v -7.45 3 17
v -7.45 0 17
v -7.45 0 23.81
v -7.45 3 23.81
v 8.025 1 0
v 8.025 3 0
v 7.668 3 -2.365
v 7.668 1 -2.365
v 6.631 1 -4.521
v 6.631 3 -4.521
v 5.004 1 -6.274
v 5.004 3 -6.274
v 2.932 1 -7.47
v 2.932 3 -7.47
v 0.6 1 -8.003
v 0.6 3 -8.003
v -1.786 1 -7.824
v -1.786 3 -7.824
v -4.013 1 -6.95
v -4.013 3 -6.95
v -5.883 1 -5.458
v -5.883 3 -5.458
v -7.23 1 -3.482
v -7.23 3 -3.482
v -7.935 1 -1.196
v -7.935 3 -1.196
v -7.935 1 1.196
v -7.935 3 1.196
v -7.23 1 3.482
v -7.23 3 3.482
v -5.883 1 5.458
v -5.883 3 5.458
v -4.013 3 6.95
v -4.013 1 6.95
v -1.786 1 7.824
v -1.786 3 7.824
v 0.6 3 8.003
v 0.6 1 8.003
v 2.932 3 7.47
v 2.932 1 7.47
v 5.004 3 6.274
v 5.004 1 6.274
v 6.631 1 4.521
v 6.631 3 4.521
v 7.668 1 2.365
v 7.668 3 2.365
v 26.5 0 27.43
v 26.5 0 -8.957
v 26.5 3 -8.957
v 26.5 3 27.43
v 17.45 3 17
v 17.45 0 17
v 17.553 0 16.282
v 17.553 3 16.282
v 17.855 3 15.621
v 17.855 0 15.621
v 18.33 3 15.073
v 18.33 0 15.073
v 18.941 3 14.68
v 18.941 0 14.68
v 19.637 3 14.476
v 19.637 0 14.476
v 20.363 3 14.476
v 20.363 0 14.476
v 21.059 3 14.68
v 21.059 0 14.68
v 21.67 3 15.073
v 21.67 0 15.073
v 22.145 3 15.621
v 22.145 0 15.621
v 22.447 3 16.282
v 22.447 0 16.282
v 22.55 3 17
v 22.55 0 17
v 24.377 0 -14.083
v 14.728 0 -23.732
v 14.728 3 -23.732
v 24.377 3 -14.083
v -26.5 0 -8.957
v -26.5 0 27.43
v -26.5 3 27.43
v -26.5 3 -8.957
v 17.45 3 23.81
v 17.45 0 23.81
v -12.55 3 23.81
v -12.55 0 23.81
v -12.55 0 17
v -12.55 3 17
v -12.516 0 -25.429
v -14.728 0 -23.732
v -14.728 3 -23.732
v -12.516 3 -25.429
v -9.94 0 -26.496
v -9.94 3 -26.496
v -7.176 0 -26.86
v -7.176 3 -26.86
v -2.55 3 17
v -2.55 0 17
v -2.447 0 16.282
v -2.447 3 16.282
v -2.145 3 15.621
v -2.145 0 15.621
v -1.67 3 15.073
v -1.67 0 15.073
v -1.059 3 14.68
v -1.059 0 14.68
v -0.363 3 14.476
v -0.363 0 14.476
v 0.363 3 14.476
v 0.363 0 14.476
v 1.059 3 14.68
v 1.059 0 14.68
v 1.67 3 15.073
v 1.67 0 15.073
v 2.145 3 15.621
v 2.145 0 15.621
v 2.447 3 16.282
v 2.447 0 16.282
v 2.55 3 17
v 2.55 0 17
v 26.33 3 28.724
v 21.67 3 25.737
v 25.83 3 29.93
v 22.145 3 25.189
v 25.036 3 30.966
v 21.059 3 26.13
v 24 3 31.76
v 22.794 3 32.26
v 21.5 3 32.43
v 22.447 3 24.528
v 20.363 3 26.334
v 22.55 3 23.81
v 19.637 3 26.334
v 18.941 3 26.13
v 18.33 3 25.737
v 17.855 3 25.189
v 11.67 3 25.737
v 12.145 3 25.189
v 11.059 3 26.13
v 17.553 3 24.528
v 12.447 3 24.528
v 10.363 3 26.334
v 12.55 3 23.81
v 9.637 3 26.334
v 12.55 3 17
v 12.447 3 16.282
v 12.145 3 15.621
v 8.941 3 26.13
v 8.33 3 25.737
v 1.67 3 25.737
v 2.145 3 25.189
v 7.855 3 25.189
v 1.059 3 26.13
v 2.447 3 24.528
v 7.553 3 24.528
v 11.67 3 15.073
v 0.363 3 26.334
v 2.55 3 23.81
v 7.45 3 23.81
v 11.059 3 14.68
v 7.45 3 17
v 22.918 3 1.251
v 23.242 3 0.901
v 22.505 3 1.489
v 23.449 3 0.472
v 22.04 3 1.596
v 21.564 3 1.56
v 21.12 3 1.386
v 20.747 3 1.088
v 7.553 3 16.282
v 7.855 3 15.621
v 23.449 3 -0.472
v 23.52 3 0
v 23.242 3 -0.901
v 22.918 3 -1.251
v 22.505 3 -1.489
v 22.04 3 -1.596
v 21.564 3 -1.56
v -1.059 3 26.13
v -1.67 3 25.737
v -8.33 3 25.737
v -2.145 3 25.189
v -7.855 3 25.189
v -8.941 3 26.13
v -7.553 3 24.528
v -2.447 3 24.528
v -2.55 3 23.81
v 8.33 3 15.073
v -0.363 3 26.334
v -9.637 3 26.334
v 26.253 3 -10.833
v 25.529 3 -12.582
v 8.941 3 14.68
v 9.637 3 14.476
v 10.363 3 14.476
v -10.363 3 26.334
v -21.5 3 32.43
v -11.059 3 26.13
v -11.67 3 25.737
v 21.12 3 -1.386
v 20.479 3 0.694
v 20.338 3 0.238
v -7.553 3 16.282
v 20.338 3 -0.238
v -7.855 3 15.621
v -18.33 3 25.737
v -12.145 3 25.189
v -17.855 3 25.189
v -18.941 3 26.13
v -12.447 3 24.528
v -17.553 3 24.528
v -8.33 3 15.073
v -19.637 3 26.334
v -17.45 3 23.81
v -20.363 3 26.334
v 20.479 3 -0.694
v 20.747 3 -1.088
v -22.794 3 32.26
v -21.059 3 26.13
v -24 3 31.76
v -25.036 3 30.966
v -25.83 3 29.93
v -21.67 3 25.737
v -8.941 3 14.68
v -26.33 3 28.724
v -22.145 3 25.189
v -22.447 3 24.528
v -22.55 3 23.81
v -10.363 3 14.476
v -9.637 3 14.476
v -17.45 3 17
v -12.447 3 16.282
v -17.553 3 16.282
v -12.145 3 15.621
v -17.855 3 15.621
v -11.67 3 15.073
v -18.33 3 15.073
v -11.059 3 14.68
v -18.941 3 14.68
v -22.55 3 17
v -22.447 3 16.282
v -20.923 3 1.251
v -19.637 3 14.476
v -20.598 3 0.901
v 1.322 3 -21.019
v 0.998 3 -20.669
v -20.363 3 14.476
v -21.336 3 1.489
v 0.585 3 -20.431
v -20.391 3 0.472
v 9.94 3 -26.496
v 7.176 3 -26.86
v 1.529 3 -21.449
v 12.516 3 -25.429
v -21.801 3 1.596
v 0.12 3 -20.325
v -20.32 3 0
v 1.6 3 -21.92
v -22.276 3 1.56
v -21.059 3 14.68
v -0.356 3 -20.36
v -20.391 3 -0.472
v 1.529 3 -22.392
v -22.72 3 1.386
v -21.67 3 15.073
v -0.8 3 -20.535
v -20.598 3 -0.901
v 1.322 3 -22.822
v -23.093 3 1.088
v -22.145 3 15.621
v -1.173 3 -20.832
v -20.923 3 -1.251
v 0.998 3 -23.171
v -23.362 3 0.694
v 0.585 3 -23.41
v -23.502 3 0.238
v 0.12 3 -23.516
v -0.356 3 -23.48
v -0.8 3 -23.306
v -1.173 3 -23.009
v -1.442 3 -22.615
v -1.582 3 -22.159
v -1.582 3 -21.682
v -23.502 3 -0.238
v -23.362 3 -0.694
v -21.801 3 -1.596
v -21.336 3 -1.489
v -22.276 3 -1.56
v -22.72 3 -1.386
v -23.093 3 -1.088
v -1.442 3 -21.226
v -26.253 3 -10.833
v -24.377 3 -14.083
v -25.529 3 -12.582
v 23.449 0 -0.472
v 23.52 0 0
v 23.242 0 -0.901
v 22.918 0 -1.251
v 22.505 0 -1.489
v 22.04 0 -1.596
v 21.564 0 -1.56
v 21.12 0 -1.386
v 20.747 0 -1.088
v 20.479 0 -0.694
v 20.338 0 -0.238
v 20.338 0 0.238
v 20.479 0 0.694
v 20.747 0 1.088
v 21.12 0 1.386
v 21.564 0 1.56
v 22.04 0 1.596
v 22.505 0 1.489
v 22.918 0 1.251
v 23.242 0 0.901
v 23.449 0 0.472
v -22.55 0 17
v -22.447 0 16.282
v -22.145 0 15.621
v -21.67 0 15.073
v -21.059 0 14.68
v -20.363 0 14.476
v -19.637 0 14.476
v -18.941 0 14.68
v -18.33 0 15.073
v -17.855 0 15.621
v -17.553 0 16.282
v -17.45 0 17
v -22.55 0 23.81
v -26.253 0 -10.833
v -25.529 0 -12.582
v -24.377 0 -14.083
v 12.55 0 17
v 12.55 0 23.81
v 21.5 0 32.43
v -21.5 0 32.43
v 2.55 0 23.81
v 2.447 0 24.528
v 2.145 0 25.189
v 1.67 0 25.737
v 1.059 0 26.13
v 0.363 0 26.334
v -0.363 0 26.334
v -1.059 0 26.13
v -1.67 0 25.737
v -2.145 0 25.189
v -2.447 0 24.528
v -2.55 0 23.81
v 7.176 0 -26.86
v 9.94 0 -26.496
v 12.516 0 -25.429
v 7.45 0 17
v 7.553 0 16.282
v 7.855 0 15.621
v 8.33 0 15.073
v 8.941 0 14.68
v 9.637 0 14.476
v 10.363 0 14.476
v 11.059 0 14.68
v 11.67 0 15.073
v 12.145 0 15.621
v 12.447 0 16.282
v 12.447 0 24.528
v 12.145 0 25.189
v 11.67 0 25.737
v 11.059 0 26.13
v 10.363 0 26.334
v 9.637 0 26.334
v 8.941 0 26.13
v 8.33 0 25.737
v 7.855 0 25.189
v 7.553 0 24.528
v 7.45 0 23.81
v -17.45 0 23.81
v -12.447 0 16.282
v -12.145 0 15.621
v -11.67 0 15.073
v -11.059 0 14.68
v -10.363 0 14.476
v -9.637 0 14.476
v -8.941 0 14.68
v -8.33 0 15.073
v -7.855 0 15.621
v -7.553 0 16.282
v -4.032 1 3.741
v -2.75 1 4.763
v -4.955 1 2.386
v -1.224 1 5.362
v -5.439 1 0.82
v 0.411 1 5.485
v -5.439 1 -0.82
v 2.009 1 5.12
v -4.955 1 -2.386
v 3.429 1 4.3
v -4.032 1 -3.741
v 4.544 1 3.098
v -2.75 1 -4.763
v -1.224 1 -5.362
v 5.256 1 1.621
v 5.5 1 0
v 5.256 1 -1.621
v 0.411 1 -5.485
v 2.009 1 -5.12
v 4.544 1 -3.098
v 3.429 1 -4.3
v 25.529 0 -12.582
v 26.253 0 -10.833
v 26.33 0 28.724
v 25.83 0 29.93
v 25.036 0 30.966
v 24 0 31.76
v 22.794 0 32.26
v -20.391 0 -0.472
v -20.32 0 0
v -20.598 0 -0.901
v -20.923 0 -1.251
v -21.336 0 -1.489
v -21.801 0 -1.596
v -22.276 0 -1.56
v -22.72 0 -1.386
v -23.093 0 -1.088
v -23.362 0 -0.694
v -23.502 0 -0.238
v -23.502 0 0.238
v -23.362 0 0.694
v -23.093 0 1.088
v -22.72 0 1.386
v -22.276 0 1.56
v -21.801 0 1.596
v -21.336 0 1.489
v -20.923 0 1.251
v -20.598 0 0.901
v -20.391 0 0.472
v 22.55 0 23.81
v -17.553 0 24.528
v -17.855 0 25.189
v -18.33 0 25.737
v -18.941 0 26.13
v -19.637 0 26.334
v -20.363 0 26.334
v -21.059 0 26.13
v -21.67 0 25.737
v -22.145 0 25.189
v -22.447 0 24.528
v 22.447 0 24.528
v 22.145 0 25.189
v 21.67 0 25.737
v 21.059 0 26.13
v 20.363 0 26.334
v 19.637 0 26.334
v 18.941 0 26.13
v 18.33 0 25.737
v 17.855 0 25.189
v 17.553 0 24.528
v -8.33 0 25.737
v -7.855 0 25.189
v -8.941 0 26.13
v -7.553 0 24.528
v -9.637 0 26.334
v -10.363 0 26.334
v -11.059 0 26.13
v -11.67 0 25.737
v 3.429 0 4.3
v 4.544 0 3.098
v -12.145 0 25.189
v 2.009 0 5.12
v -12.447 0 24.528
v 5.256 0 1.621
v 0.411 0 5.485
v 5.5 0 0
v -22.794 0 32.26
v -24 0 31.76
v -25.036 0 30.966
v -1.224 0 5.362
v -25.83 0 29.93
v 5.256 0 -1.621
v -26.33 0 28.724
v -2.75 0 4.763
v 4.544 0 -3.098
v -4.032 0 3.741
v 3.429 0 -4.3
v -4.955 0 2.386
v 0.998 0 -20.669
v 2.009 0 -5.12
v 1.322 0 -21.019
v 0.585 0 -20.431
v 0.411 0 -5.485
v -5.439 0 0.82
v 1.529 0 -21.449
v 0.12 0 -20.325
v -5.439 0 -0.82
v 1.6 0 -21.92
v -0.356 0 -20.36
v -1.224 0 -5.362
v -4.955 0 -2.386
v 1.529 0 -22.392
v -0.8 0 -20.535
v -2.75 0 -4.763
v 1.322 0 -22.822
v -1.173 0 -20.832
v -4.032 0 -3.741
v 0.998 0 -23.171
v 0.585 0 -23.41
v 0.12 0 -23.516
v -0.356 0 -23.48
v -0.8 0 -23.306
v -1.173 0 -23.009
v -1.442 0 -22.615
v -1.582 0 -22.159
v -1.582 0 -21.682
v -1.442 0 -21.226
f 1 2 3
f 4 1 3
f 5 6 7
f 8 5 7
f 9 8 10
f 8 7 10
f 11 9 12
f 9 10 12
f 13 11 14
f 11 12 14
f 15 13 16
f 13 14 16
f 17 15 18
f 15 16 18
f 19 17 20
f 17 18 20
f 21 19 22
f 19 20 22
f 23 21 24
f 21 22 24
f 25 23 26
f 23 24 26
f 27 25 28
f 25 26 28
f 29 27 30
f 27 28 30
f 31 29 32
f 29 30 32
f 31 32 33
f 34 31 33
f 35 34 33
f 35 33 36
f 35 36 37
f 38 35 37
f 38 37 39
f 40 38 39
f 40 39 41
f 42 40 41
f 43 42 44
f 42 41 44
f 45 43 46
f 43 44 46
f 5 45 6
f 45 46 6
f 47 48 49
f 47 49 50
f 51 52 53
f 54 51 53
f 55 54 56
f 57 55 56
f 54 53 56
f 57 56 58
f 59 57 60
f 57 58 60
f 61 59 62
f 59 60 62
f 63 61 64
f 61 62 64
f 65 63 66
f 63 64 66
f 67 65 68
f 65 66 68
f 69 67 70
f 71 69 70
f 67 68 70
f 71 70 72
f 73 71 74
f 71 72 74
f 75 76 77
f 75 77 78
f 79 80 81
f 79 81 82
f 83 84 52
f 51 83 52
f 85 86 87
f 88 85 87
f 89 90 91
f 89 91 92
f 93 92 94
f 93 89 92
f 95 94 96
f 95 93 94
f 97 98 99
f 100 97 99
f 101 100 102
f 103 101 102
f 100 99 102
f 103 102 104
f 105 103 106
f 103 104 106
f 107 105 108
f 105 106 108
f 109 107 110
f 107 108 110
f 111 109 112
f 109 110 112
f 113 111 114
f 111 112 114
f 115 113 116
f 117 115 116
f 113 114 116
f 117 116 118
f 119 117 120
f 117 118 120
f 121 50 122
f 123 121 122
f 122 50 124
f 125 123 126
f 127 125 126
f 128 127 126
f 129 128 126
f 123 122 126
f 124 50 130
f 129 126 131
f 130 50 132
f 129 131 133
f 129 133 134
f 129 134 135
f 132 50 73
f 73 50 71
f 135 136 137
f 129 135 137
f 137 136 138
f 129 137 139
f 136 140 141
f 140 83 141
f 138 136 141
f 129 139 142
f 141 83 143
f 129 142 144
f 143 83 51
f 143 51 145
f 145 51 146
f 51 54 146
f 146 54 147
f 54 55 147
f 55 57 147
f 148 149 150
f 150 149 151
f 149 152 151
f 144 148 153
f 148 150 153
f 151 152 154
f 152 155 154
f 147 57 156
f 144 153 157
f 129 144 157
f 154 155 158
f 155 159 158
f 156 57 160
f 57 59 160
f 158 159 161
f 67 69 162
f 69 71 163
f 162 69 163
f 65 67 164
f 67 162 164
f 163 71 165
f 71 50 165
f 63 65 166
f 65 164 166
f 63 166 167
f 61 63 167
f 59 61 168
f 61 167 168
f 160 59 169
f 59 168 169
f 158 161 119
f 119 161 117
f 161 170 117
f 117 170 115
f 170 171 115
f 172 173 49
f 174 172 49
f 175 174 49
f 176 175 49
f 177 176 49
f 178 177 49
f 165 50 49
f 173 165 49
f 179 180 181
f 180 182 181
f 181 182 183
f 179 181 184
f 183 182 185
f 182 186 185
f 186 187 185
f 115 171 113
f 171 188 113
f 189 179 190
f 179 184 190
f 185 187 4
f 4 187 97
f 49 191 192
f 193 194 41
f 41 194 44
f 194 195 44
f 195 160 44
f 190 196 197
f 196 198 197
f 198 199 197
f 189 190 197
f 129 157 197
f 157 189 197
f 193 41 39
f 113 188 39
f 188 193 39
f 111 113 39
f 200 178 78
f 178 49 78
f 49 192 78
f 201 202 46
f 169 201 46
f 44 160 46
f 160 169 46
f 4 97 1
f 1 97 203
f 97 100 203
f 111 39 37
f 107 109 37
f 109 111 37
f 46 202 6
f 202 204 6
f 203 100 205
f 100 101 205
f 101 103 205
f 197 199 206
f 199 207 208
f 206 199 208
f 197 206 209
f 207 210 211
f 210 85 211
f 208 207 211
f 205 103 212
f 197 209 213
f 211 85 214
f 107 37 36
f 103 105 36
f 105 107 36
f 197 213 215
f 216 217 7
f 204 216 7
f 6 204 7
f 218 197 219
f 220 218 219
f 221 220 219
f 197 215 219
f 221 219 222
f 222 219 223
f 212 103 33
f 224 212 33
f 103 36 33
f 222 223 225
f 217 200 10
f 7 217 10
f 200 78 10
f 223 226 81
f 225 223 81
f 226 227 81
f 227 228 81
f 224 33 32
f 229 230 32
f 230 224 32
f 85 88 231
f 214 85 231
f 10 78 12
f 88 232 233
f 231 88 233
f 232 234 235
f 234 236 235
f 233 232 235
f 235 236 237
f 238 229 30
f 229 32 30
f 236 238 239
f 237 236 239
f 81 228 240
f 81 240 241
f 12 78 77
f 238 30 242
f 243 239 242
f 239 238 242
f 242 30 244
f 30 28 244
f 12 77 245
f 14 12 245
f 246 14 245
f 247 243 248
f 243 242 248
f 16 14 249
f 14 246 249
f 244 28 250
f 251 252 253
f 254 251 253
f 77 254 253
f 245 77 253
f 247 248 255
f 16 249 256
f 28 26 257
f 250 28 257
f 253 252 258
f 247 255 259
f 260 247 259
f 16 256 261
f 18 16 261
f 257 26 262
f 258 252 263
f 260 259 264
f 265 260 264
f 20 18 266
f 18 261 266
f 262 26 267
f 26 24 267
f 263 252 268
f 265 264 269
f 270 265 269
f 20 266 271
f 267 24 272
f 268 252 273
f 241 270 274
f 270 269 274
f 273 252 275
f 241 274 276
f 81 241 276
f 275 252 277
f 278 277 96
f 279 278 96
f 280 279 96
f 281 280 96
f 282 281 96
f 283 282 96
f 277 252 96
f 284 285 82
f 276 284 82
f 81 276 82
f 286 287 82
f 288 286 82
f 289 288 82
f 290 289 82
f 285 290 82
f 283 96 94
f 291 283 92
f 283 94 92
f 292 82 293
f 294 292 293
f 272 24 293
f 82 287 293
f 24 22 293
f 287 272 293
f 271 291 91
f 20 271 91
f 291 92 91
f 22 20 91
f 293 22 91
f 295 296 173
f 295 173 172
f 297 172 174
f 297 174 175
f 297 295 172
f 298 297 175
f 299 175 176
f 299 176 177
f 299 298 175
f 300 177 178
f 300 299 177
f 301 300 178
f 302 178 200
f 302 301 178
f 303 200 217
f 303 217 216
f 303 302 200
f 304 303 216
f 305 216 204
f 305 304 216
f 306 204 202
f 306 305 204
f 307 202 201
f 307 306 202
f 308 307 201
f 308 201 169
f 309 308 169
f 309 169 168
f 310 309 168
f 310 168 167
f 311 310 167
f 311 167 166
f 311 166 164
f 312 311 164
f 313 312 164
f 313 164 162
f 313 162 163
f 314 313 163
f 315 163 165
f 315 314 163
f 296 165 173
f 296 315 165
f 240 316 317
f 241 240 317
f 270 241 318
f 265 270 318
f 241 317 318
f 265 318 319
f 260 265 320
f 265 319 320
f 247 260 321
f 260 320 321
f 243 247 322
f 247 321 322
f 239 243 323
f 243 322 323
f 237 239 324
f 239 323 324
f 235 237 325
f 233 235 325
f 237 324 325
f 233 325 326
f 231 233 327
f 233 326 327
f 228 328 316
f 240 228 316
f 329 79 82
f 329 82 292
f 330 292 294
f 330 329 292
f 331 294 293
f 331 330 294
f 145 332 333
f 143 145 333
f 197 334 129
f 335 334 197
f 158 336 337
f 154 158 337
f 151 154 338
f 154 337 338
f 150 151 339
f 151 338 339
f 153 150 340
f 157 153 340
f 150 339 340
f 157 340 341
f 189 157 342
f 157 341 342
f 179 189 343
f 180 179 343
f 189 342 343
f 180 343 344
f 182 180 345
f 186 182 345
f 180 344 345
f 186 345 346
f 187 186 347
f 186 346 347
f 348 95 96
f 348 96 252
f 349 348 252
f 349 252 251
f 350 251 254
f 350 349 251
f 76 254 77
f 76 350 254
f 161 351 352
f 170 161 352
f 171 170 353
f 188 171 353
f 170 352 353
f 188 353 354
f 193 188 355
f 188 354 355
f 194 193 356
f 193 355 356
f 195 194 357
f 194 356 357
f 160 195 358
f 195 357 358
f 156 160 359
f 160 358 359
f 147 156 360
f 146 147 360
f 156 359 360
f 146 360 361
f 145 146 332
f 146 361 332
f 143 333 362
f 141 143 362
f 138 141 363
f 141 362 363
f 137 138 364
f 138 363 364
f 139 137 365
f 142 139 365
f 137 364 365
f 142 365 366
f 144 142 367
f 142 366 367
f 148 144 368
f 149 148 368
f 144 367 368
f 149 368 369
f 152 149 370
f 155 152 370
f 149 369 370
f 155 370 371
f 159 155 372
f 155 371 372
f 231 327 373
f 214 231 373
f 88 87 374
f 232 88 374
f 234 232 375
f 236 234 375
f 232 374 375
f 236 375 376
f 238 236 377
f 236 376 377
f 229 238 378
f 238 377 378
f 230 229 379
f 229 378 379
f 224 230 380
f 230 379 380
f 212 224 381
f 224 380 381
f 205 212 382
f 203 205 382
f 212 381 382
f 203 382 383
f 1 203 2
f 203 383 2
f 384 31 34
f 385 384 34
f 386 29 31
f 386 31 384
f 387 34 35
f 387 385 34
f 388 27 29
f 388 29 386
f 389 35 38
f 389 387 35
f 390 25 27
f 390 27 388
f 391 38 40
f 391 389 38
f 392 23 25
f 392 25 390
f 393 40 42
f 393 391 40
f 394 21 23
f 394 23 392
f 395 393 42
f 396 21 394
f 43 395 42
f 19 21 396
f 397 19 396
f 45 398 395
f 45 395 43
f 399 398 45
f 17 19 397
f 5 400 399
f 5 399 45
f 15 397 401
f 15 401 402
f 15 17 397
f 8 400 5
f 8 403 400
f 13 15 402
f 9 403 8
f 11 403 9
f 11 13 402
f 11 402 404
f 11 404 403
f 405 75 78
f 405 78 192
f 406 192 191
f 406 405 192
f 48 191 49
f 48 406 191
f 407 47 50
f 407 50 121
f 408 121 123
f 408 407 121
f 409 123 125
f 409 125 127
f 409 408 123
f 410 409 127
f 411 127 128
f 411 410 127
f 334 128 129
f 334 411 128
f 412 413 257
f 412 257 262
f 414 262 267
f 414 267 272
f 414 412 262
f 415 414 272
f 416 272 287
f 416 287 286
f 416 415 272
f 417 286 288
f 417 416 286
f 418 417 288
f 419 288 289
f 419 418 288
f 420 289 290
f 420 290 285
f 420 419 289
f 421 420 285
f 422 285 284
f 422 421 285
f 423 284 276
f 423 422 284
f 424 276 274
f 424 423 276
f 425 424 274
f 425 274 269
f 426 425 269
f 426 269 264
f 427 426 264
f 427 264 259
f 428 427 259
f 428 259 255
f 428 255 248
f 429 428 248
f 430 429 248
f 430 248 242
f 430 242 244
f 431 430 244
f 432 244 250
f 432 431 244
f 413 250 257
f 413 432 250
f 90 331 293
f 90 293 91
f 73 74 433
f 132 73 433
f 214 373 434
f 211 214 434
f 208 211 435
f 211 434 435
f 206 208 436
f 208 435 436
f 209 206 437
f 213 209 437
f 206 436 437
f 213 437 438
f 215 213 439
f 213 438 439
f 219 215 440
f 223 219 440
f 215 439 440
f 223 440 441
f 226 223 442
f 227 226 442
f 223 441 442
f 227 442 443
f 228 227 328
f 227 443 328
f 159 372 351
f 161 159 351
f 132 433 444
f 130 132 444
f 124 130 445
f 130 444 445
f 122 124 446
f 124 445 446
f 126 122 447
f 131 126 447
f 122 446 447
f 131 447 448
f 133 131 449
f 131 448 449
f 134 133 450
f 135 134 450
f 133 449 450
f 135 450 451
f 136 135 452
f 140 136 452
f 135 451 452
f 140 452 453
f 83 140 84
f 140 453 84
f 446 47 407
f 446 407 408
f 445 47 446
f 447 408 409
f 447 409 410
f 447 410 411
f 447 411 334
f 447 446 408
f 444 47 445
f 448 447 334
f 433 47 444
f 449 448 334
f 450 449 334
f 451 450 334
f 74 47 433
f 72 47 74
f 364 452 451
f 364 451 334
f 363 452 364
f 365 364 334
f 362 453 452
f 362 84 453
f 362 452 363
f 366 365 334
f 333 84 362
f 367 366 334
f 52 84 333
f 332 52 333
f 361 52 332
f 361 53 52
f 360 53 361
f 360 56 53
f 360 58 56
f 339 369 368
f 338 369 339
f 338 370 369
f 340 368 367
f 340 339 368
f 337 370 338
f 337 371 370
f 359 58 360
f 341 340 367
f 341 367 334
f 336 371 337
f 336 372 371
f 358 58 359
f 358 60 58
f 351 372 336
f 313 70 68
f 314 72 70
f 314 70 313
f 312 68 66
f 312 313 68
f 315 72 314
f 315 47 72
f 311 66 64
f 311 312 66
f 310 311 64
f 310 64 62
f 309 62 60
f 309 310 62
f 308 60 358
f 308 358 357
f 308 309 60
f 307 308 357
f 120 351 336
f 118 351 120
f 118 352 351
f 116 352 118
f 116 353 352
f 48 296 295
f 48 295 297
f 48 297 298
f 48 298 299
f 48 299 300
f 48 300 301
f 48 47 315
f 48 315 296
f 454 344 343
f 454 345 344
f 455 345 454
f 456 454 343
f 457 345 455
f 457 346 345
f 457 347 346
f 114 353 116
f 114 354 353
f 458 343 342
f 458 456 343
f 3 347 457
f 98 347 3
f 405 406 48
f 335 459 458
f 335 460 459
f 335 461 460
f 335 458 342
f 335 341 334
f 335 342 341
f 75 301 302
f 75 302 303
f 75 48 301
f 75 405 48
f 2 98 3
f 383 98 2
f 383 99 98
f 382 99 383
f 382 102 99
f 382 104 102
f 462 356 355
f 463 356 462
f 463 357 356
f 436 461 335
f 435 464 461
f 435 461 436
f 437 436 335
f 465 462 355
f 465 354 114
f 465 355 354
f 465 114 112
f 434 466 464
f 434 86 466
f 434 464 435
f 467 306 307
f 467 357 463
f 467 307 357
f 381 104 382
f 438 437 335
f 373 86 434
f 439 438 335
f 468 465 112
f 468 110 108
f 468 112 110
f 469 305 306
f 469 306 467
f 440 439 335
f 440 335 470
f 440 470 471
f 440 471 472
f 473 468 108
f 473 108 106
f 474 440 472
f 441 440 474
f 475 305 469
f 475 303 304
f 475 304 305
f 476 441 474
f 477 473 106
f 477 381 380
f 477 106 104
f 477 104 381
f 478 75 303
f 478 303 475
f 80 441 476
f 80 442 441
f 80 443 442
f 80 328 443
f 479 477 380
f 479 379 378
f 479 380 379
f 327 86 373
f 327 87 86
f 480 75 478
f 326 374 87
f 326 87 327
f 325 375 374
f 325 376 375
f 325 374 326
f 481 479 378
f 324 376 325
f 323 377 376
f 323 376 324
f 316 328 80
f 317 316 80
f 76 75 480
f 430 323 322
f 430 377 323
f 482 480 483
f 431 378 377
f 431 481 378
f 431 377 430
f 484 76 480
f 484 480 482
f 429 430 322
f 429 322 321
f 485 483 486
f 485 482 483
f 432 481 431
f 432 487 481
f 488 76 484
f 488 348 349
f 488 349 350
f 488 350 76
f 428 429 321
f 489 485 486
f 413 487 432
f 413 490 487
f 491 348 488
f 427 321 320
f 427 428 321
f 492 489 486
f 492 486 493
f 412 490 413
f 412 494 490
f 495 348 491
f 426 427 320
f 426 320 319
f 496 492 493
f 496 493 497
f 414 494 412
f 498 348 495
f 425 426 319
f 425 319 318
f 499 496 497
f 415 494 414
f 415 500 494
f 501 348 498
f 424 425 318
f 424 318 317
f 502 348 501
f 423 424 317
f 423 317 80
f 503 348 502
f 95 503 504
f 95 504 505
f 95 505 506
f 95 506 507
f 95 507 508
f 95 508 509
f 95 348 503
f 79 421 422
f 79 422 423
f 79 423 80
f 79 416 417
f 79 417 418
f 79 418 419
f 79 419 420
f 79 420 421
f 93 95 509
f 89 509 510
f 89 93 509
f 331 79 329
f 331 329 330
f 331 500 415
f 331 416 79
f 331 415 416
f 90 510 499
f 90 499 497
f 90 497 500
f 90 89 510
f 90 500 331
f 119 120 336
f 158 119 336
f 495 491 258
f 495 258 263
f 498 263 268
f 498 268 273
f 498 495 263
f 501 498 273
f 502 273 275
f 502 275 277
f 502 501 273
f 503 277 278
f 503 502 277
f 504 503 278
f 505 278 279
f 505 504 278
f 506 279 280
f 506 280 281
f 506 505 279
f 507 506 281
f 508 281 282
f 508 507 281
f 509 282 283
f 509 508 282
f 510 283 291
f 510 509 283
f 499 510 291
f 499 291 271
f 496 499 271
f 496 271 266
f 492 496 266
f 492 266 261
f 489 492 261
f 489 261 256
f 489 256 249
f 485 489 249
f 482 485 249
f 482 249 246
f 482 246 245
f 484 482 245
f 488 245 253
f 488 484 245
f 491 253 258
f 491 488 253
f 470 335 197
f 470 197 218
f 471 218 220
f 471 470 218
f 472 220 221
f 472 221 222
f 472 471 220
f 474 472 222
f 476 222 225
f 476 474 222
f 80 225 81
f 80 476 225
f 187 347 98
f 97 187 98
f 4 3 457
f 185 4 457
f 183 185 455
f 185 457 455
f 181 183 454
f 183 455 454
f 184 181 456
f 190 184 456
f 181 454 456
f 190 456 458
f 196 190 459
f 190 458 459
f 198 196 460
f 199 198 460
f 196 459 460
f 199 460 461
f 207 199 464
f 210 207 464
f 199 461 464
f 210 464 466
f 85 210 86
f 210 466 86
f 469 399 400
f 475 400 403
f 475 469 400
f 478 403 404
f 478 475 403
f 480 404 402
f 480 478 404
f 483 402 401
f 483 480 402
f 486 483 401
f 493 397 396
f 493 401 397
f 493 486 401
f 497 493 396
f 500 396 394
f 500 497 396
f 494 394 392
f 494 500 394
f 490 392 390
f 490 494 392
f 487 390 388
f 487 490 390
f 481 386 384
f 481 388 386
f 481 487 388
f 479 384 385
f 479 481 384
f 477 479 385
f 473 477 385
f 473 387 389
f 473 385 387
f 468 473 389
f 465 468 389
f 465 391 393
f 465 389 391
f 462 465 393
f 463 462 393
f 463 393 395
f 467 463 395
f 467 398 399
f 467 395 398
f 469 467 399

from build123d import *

# Parameters (mm, degrees)
SKETCH1_R           = 1.6
SKETCH1_R_2         = 5.5
BOSS_EXTRUDE1_DEPTH = 3
SKETCH2_R           = 8.025
CUT_EXTRUDE1_DEPTH  = 2


with BuildPart() as part:
    # Sketch1 → Boss-Extrude1 (new body)
    with BuildSketch(Plane(origin=(0, 0, 0), x_dir=(1, 0, 0), z_dir=(0, 1, 0))):
        with BuildLine():
            Line((21.5, -32.43), (-21.5, -32.43))
            ThreePointArc((-21.5, -32.43), (-25.035533906, -30.965533906), (-26.5, -27.43))
            Line((-26.5, -27.43), (-26.5, 8.956951673))
            ThreePointArc((-26.5, 8.956951673), (-25.948126611, 11.731406557), (-24.376524164, 14.083475836))
            Line((-24.376524164, 14.083475836), (-14.728099577, 23.731900423))
            ThreePointArc((-14.728099577, 23.731900423), (-11.263258212, 26.047033407), (-7.176199154, 26.86))
            Line((-7.176199154, 26.86), (7.176199154, 26.86))
            ThreePointArc((7.176199154, 26.86), (11.263258212, 26.047033407), (14.728099577, 23.731900423))
            Line((14.728099577, 23.731900423), (24.376524164, 14.083475836))
            ThreePointArc((24.376524164, 14.083475836), (25.948126611, 11.731406557), (26.5, 8.956951673))
            Line((26.5, 8.956951673), (26.5, -27.43))
            ThreePointArc((26.5, -27.43), (25.035533906, -30.965533906), (21.5, -32.43))
        make_face()
        with Locations((21.920310217, 0)):
            Circle(SKETCH1_R, mode=Mode.SUBTRACT)
        with Locations((-21.920310217, 0)):
            Circle(SKETCH1_R, mode=Mode.SUBTRACT)
        Circle(SKETCH1_R_2, mode=Mode.SUBTRACT)
        with Locations((0, 21.920310217)):
            Circle(SKETCH1_R, mode=Mode.SUBTRACT)
        with BuildLine():
            Line((17.45, -23.81), (17.45, -17))
            ThreePointArc((17.45, -17), (20, -14.45), (22.55, -17))
            Line((22.55, -17), (22.55, -23.81))
            ThreePointArc((22.55, -23.81), (20, -26.36), (17.45, -23.81))
        make_face(mode=Mode.SUBTRACT)
        with BuildLine():
            Line((7.45, -23.81), (7.45, -17))
            ThreePointArc((7.45, -17), (10, -14.45), (12.55, -17))
            Line((12.55, -17), (12.55, -23.81))
            ThreePointArc((12.55, -23.81), (10, -26.36), (7.45, -23.81))
        make_face(mode=Mode.SUBTRACT)
        with BuildLine():
            Line((-2.55, -23.81), (-2.55, -17))
            ThreePointArc((-2.55, -17), (0, -14.45), (2.55, -17))
            Line((2.55, -17), (2.55, -23.81))
            ThreePointArc((2.55, -23.81), (0, -26.36), (-2.55, -23.81))
        make_face(mode=Mode.SUBTRACT)
        with BuildLine():
            Line((-12.55, -23.81), (-12.55, -17))
            ThreePointArc((-12.55, -17), (-10, -14.45), (-7.45, -17))
            Line((-7.45, -17), (-7.45, -23.81))
            ThreePointArc((-7.45, -23.81), (-10, -26.36), (-12.55, -23.81))
        make_face(mode=Mode.SUBTRACT)
        with BuildLine():
            Line((-22.55, -23.81), (-22.55, -17))
            ThreePointArc((-22.55, -17), (-20, -14.45), (-17.45, -17))
            Line((-17.45, -17), (-17.45, -23.81))
            ThreePointArc((-17.45, -23.81), (-20, -26.36), (-22.55, -23.81))
        make_face(mode=Mode.SUBTRACT)
    extrude(amount=BOSS_EXTRUDE1_DEPTH)

    # Sketch2 → Cut-Extrude1 (cut)
    with BuildSketch(Plane(origin=(0, 3, 0), x_dir=(1, 0, 0), z_dir=(0, 1, 0))):
        Circle(SKETCH2_R)
    extrude(amount=-CUT_EXTRUDE1_DEPTH, mode=Mode.SUBTRACT)


solid = part.part
